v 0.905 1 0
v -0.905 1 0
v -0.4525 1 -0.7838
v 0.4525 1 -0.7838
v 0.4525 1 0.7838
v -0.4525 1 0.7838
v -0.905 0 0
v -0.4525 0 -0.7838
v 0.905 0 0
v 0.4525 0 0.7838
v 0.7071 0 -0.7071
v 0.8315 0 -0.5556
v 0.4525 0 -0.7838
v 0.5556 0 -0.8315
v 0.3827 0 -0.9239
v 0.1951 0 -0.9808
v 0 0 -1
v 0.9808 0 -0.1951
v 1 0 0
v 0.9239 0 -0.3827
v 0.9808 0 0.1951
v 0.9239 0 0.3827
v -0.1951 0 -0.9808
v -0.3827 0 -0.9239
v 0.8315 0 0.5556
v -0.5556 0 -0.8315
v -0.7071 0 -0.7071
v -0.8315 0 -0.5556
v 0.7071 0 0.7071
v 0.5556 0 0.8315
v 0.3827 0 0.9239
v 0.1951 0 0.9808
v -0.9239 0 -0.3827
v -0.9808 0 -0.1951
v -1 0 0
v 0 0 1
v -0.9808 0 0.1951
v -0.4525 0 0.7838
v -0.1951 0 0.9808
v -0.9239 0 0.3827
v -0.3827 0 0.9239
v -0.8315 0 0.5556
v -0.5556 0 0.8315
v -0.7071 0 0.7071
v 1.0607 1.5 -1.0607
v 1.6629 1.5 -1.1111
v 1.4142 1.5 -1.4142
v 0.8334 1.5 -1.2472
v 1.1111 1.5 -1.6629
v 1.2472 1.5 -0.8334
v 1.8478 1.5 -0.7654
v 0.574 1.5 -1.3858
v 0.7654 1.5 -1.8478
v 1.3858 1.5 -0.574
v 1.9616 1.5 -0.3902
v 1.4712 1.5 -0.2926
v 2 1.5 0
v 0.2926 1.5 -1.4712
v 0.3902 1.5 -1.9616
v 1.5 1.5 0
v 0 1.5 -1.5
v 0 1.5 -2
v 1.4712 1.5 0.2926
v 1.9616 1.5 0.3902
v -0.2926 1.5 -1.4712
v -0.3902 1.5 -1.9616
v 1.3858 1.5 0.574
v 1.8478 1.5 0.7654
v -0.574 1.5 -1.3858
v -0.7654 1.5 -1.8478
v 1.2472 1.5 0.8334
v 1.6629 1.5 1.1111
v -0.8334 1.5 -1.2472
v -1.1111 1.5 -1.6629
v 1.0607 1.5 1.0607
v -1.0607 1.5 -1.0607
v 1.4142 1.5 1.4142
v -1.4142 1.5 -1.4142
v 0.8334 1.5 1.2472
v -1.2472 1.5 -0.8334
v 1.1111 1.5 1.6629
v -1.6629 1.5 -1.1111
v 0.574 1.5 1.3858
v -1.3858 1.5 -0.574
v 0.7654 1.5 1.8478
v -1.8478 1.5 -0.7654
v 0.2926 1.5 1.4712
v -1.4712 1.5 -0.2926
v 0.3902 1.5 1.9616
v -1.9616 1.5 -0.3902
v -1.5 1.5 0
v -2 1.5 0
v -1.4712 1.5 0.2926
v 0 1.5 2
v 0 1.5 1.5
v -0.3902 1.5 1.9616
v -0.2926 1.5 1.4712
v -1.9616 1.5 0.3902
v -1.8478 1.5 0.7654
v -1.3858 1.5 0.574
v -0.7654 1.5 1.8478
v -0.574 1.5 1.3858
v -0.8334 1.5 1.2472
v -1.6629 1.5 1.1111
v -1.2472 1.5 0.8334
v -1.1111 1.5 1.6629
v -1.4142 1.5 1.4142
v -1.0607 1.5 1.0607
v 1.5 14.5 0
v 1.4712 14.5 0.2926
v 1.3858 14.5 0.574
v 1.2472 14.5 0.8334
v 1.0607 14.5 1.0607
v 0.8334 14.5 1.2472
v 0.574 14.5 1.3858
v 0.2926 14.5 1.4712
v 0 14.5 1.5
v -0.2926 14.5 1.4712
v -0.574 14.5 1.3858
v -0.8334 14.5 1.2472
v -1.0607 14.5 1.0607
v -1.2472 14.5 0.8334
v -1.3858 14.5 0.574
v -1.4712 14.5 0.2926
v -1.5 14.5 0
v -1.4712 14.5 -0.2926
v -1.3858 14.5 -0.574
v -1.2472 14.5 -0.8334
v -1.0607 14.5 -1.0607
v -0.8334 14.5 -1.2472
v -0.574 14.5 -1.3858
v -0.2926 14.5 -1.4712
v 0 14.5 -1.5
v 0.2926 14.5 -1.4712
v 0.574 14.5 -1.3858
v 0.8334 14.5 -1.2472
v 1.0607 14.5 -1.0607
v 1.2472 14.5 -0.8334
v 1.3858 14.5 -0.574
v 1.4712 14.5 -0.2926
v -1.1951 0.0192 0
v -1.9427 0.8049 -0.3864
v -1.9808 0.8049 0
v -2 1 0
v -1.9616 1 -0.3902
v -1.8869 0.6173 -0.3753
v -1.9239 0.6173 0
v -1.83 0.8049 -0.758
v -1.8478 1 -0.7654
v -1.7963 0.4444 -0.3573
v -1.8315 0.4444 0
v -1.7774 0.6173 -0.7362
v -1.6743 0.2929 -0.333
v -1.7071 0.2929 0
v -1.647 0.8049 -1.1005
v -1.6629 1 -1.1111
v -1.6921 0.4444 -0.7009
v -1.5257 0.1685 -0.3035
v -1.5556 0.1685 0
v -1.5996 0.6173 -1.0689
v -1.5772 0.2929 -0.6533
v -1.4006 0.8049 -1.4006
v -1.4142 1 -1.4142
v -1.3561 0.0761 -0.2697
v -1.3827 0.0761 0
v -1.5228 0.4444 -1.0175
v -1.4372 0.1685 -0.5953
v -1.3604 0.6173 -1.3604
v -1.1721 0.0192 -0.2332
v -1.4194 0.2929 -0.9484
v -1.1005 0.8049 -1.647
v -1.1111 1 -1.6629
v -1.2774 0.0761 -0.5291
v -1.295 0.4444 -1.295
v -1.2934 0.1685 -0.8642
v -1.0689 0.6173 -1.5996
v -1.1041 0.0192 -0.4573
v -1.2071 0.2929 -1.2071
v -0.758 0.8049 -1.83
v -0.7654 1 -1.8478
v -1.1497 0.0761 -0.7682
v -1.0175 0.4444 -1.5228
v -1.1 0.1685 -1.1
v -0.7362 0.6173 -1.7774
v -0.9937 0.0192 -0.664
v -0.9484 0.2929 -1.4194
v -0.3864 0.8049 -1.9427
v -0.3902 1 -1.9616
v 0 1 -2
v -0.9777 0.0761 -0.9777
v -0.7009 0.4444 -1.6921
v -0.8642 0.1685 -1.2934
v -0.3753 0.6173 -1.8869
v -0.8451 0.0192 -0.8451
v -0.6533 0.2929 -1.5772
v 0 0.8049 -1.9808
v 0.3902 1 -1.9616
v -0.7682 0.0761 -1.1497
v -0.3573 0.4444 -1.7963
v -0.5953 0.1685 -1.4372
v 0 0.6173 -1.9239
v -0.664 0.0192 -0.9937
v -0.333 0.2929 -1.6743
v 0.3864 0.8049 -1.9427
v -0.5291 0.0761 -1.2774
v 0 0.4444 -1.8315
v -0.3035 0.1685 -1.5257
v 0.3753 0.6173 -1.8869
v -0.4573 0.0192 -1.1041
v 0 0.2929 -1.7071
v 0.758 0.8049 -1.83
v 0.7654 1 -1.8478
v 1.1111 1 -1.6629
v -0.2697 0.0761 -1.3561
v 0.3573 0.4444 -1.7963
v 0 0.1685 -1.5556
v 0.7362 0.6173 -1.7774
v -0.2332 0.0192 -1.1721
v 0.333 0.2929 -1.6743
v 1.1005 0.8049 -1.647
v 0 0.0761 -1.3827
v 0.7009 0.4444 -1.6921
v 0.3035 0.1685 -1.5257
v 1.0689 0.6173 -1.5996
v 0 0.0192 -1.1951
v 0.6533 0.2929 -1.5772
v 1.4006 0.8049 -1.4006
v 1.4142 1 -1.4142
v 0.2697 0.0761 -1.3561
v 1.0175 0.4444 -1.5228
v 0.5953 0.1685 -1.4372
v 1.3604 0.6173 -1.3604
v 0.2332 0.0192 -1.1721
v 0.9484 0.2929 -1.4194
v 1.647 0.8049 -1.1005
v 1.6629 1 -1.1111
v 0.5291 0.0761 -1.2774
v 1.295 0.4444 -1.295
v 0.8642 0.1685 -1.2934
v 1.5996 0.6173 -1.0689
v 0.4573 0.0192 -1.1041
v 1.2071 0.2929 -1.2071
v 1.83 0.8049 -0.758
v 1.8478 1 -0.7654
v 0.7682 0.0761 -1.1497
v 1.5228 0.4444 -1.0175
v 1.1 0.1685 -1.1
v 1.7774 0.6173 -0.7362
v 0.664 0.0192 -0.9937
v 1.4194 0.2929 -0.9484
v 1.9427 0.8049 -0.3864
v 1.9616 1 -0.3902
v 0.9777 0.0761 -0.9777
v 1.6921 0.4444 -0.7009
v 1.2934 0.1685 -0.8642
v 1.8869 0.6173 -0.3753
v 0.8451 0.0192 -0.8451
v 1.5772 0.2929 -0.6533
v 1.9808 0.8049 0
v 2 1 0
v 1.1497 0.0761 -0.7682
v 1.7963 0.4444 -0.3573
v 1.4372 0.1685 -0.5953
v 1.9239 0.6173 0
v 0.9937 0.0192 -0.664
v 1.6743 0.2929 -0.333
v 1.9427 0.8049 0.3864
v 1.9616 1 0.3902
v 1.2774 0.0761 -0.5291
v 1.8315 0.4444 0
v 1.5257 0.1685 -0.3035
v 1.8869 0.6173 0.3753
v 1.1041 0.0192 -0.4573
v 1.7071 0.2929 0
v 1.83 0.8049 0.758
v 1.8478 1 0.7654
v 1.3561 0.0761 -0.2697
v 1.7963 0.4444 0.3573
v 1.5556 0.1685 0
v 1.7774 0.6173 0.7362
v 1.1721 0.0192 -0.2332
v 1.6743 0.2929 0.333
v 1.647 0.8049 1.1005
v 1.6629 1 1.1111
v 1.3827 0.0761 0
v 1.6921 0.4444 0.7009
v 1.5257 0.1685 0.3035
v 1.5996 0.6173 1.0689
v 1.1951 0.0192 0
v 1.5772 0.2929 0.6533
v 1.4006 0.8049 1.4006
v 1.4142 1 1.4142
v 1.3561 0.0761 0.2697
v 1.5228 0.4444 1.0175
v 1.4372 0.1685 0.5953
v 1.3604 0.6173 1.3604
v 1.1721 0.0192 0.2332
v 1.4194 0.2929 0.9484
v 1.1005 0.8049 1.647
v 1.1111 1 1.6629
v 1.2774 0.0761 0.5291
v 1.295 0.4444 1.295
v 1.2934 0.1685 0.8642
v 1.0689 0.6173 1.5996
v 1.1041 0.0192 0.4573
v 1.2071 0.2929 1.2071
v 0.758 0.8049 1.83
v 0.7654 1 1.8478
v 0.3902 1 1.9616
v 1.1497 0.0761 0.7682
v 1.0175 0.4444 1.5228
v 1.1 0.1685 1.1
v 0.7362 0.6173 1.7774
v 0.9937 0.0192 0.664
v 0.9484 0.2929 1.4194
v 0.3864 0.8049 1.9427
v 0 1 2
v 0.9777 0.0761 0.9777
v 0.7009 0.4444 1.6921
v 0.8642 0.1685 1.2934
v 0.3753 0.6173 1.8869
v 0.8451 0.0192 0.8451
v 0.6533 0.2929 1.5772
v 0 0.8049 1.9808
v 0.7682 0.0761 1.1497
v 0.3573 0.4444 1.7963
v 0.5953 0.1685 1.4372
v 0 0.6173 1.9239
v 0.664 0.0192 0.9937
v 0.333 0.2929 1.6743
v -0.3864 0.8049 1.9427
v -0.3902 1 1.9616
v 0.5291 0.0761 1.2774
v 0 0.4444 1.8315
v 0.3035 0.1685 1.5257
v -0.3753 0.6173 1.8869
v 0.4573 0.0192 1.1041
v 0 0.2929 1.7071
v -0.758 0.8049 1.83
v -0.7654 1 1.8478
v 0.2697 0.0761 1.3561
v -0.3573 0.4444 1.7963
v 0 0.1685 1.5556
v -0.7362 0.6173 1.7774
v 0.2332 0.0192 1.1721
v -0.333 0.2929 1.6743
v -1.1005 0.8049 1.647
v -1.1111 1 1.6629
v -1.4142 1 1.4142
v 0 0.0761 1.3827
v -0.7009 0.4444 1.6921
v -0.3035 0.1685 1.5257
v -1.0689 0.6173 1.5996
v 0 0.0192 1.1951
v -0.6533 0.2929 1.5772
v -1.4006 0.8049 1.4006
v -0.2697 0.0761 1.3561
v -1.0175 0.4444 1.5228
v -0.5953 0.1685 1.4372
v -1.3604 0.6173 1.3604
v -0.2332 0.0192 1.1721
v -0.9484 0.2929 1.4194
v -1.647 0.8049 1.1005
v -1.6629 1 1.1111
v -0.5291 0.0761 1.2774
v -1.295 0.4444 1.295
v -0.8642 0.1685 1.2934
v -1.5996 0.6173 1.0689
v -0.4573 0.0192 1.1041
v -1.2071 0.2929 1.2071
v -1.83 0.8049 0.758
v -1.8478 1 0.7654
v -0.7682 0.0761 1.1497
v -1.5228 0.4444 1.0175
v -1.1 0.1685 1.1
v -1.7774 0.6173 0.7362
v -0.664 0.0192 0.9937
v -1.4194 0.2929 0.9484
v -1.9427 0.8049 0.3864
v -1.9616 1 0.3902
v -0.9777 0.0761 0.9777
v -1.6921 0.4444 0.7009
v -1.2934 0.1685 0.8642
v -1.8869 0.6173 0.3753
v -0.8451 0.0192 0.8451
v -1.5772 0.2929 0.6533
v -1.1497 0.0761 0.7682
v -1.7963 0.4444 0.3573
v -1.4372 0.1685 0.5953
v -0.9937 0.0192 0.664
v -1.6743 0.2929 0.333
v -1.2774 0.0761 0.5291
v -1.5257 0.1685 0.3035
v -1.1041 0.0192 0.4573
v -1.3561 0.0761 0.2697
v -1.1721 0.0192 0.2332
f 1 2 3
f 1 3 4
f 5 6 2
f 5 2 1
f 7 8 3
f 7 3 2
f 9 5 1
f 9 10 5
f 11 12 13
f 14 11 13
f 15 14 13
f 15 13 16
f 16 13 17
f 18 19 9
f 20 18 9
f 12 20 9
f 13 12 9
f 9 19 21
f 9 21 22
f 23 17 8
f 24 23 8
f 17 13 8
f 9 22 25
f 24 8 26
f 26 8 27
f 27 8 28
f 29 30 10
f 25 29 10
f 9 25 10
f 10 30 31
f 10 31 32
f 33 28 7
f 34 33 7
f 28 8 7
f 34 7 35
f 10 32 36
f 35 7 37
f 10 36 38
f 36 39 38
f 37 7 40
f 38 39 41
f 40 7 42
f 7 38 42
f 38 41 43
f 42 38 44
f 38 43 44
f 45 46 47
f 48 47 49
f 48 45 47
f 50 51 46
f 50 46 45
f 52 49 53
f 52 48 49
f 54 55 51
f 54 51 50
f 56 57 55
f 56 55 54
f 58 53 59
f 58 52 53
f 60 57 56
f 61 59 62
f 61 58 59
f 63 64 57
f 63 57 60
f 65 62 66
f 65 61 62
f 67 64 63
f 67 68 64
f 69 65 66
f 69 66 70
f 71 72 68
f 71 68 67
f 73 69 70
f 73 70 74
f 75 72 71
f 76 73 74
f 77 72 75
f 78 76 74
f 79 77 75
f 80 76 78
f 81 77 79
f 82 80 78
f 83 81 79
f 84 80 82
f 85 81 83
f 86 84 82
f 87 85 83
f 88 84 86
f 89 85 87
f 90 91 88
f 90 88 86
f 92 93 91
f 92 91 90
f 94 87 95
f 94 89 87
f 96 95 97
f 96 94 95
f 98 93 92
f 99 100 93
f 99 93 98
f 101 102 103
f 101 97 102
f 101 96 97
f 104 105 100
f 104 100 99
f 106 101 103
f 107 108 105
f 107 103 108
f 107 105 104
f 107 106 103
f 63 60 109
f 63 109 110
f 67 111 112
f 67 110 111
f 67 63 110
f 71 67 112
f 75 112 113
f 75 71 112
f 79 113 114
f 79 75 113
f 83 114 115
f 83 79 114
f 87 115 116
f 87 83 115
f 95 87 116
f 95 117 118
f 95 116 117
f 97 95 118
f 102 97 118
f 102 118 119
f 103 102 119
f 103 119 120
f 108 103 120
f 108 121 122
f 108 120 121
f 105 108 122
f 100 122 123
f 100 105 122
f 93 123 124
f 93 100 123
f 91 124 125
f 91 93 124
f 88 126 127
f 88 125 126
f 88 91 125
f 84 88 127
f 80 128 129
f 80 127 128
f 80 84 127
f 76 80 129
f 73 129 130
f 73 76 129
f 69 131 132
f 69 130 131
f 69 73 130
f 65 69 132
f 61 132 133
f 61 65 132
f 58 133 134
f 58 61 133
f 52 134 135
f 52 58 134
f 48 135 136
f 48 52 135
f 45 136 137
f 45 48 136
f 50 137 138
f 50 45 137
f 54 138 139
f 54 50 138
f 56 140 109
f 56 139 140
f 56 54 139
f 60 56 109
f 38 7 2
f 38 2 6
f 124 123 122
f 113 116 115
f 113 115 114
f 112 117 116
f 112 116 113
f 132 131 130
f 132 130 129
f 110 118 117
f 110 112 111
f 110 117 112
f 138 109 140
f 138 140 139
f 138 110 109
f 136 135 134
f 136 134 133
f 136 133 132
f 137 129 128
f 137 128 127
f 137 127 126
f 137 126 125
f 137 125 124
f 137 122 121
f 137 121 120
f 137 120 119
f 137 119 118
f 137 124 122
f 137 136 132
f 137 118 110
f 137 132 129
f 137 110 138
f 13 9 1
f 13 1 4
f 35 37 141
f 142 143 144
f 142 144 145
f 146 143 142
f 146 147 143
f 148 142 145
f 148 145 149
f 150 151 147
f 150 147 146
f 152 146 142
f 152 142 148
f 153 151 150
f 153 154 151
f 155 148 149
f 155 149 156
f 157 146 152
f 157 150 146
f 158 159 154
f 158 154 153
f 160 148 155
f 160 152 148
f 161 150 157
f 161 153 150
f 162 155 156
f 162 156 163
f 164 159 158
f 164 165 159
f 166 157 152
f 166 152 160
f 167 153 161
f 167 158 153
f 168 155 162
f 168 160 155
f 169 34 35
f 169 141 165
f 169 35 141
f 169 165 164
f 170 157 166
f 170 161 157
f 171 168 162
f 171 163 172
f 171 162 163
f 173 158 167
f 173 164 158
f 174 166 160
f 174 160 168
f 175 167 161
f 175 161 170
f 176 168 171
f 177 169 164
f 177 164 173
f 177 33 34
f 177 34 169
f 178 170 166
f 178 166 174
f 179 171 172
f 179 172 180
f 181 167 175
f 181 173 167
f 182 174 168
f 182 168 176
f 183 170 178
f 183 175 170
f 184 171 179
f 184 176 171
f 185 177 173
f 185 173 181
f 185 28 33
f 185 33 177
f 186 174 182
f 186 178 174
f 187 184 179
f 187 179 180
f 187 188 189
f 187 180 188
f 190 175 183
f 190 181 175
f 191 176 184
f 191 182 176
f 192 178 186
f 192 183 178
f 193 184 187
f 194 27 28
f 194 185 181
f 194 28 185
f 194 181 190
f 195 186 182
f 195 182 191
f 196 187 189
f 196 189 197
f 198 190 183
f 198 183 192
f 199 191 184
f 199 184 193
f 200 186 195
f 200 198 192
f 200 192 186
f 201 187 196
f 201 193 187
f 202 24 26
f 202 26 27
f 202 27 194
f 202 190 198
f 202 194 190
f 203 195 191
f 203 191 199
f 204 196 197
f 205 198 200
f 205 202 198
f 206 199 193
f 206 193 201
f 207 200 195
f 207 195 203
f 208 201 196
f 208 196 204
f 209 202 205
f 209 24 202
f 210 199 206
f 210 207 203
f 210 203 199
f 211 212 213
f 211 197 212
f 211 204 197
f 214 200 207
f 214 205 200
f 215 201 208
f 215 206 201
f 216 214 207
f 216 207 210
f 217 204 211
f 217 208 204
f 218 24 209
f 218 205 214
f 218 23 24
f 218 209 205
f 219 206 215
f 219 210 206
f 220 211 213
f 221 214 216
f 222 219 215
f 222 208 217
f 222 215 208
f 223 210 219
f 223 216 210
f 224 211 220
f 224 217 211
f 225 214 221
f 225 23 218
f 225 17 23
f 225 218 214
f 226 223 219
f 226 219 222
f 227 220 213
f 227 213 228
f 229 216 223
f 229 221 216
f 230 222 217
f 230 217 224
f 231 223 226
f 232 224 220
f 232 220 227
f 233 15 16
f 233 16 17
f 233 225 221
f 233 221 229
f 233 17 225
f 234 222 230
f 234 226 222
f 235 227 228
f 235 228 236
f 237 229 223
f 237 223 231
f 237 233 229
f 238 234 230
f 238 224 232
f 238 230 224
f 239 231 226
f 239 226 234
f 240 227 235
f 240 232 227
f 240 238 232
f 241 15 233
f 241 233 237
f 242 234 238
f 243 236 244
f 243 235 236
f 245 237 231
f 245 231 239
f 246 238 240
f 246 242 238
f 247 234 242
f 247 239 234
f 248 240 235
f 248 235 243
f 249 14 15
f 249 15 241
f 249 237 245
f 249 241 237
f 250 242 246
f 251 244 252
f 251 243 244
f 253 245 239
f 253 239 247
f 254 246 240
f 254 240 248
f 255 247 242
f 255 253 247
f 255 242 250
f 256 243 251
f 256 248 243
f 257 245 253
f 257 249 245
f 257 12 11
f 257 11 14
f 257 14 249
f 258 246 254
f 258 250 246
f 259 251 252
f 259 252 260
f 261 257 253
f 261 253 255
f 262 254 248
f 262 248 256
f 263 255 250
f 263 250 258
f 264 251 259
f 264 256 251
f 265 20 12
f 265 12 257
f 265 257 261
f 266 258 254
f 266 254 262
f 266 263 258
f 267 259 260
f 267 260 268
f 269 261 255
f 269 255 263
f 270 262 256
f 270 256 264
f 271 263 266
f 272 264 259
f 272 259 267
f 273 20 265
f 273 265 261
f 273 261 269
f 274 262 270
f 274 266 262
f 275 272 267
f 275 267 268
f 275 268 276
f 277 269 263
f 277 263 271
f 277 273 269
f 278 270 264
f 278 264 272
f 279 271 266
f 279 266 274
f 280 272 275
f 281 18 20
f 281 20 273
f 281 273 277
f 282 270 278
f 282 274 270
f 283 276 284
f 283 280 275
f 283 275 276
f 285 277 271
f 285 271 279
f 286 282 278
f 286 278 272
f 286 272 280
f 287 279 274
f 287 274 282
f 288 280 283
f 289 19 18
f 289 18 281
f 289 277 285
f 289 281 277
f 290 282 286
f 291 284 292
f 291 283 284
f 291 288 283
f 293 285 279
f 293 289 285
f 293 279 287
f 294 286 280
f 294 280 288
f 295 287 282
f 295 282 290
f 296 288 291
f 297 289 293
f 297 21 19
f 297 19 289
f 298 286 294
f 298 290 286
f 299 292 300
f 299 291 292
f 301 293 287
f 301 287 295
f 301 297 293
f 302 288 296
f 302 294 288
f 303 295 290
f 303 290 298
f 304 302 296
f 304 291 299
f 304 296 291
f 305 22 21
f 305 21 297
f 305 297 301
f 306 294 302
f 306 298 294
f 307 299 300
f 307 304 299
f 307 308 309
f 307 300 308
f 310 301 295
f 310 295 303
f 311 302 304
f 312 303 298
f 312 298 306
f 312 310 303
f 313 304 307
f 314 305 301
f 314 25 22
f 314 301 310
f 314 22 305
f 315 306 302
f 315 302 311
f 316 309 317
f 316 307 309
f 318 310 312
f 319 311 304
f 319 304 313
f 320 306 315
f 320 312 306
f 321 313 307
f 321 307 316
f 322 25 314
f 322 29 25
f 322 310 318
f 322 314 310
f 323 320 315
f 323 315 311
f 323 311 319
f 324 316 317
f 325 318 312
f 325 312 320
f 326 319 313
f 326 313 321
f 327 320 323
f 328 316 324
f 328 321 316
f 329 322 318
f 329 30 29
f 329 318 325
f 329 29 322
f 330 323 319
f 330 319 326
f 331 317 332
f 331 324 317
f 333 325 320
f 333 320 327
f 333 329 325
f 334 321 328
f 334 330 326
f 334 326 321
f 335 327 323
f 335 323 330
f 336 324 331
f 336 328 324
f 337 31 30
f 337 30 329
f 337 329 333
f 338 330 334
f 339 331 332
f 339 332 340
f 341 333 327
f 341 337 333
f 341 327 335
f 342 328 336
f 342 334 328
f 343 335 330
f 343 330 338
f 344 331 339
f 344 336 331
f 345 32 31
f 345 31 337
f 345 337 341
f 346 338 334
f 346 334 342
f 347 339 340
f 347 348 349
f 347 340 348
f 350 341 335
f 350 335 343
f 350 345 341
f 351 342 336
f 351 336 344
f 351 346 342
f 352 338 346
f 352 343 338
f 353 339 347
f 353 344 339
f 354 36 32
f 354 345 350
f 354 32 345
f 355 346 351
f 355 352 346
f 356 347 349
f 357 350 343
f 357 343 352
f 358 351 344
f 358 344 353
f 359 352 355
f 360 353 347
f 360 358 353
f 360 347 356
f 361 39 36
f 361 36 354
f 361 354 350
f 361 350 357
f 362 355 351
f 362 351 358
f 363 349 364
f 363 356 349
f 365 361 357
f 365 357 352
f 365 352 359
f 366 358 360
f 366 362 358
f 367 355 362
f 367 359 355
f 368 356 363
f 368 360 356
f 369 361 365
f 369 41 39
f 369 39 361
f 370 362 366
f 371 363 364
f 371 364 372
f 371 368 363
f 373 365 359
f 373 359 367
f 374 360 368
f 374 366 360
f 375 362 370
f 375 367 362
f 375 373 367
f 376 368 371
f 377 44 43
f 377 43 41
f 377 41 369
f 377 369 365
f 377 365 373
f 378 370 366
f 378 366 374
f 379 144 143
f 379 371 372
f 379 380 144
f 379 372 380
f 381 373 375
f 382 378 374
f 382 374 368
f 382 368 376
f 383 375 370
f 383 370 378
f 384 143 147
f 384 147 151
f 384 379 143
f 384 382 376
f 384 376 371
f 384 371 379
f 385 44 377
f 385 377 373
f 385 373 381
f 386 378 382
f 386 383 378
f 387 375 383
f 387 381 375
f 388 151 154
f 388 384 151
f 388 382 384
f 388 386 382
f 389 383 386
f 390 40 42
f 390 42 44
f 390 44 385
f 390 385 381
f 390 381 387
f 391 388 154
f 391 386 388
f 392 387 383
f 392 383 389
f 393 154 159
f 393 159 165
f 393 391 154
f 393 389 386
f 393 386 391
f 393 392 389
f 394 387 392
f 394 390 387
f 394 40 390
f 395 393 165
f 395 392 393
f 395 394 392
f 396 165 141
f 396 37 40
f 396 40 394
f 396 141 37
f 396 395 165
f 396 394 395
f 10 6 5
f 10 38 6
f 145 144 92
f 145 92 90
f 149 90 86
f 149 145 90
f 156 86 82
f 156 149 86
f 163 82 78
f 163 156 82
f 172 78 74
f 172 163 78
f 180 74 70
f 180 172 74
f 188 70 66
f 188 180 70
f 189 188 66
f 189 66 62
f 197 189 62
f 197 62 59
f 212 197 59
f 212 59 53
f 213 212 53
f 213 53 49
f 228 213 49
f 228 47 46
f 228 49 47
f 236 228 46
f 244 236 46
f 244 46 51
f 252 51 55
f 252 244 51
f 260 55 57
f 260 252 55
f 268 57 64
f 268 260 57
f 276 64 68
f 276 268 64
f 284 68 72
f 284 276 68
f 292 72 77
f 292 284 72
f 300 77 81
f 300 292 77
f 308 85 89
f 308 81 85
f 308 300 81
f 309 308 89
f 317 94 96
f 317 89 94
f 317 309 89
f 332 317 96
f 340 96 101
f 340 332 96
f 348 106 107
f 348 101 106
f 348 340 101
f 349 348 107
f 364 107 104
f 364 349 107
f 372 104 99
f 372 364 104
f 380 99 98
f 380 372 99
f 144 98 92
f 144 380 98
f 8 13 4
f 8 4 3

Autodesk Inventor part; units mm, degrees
ref_plane "YZ Plane" through (0, 0, 0) normal (1, 0, 0) x (0, 1, 0)
ref_plane "XZ Plane" through (0, 0, 0) normal (0, 1, 0) x (-1, 0, 0)
ref_plane "XY Plane" through (0, 0, 0) normal (0, 0, 1) x (1, 0, 0)
sketch "Sketch1" plane through (0, 0, 0) normal (0, 1, 0) x (-1, 0, 0)
  circle A0 centre (0, 0) radius 2
  dimension "d0" = 4
extrude "Extrusion1" add sketch "Sketch1" along normal blind 1.5
sketch "Sketch2" plane through (0, 1.5, 0) normal (0, 1, 0) x (1, 0, 0)
  circle A0 centre (0, 0) radius 1.5
  dimension "d3" = 3
extrude "Extrusion2" add sketch "Sketch2" along normal blind 13
sketch "Sketch3" plane through (0, 0, 0) normal (0, -1, 0) x (1, 0, 0)
  line L0 (0.905, 0) -> (0.4525, -0.7838)
  line L1 (0.4525, -0.7838) -> (-0.4525, -0.7838)
  line L2 (-0.4525, -0.7838) -> (-0.905, 0)
  line L3 (-0.905, 0) -> (-0.4525, 0.7838)
  line L4 (-0.4525, 0.7838) -> (0.4525, 0.7838)
  line L5 (0.4525, 0.7838) -> (0.905, 0)
  point P0 (0, 0)
  point P1 (0, 0)
extrude "Extrusion3" cut sketch "Sketch3" against normal blind 1
fillet "Fillet1" radius 1 1 edges at (2, 0, 0)
thread "Thread1" size "M3x0.35" class "6g" standard "ANSI Metric M Profile" full length
properties part number "M3x13"
